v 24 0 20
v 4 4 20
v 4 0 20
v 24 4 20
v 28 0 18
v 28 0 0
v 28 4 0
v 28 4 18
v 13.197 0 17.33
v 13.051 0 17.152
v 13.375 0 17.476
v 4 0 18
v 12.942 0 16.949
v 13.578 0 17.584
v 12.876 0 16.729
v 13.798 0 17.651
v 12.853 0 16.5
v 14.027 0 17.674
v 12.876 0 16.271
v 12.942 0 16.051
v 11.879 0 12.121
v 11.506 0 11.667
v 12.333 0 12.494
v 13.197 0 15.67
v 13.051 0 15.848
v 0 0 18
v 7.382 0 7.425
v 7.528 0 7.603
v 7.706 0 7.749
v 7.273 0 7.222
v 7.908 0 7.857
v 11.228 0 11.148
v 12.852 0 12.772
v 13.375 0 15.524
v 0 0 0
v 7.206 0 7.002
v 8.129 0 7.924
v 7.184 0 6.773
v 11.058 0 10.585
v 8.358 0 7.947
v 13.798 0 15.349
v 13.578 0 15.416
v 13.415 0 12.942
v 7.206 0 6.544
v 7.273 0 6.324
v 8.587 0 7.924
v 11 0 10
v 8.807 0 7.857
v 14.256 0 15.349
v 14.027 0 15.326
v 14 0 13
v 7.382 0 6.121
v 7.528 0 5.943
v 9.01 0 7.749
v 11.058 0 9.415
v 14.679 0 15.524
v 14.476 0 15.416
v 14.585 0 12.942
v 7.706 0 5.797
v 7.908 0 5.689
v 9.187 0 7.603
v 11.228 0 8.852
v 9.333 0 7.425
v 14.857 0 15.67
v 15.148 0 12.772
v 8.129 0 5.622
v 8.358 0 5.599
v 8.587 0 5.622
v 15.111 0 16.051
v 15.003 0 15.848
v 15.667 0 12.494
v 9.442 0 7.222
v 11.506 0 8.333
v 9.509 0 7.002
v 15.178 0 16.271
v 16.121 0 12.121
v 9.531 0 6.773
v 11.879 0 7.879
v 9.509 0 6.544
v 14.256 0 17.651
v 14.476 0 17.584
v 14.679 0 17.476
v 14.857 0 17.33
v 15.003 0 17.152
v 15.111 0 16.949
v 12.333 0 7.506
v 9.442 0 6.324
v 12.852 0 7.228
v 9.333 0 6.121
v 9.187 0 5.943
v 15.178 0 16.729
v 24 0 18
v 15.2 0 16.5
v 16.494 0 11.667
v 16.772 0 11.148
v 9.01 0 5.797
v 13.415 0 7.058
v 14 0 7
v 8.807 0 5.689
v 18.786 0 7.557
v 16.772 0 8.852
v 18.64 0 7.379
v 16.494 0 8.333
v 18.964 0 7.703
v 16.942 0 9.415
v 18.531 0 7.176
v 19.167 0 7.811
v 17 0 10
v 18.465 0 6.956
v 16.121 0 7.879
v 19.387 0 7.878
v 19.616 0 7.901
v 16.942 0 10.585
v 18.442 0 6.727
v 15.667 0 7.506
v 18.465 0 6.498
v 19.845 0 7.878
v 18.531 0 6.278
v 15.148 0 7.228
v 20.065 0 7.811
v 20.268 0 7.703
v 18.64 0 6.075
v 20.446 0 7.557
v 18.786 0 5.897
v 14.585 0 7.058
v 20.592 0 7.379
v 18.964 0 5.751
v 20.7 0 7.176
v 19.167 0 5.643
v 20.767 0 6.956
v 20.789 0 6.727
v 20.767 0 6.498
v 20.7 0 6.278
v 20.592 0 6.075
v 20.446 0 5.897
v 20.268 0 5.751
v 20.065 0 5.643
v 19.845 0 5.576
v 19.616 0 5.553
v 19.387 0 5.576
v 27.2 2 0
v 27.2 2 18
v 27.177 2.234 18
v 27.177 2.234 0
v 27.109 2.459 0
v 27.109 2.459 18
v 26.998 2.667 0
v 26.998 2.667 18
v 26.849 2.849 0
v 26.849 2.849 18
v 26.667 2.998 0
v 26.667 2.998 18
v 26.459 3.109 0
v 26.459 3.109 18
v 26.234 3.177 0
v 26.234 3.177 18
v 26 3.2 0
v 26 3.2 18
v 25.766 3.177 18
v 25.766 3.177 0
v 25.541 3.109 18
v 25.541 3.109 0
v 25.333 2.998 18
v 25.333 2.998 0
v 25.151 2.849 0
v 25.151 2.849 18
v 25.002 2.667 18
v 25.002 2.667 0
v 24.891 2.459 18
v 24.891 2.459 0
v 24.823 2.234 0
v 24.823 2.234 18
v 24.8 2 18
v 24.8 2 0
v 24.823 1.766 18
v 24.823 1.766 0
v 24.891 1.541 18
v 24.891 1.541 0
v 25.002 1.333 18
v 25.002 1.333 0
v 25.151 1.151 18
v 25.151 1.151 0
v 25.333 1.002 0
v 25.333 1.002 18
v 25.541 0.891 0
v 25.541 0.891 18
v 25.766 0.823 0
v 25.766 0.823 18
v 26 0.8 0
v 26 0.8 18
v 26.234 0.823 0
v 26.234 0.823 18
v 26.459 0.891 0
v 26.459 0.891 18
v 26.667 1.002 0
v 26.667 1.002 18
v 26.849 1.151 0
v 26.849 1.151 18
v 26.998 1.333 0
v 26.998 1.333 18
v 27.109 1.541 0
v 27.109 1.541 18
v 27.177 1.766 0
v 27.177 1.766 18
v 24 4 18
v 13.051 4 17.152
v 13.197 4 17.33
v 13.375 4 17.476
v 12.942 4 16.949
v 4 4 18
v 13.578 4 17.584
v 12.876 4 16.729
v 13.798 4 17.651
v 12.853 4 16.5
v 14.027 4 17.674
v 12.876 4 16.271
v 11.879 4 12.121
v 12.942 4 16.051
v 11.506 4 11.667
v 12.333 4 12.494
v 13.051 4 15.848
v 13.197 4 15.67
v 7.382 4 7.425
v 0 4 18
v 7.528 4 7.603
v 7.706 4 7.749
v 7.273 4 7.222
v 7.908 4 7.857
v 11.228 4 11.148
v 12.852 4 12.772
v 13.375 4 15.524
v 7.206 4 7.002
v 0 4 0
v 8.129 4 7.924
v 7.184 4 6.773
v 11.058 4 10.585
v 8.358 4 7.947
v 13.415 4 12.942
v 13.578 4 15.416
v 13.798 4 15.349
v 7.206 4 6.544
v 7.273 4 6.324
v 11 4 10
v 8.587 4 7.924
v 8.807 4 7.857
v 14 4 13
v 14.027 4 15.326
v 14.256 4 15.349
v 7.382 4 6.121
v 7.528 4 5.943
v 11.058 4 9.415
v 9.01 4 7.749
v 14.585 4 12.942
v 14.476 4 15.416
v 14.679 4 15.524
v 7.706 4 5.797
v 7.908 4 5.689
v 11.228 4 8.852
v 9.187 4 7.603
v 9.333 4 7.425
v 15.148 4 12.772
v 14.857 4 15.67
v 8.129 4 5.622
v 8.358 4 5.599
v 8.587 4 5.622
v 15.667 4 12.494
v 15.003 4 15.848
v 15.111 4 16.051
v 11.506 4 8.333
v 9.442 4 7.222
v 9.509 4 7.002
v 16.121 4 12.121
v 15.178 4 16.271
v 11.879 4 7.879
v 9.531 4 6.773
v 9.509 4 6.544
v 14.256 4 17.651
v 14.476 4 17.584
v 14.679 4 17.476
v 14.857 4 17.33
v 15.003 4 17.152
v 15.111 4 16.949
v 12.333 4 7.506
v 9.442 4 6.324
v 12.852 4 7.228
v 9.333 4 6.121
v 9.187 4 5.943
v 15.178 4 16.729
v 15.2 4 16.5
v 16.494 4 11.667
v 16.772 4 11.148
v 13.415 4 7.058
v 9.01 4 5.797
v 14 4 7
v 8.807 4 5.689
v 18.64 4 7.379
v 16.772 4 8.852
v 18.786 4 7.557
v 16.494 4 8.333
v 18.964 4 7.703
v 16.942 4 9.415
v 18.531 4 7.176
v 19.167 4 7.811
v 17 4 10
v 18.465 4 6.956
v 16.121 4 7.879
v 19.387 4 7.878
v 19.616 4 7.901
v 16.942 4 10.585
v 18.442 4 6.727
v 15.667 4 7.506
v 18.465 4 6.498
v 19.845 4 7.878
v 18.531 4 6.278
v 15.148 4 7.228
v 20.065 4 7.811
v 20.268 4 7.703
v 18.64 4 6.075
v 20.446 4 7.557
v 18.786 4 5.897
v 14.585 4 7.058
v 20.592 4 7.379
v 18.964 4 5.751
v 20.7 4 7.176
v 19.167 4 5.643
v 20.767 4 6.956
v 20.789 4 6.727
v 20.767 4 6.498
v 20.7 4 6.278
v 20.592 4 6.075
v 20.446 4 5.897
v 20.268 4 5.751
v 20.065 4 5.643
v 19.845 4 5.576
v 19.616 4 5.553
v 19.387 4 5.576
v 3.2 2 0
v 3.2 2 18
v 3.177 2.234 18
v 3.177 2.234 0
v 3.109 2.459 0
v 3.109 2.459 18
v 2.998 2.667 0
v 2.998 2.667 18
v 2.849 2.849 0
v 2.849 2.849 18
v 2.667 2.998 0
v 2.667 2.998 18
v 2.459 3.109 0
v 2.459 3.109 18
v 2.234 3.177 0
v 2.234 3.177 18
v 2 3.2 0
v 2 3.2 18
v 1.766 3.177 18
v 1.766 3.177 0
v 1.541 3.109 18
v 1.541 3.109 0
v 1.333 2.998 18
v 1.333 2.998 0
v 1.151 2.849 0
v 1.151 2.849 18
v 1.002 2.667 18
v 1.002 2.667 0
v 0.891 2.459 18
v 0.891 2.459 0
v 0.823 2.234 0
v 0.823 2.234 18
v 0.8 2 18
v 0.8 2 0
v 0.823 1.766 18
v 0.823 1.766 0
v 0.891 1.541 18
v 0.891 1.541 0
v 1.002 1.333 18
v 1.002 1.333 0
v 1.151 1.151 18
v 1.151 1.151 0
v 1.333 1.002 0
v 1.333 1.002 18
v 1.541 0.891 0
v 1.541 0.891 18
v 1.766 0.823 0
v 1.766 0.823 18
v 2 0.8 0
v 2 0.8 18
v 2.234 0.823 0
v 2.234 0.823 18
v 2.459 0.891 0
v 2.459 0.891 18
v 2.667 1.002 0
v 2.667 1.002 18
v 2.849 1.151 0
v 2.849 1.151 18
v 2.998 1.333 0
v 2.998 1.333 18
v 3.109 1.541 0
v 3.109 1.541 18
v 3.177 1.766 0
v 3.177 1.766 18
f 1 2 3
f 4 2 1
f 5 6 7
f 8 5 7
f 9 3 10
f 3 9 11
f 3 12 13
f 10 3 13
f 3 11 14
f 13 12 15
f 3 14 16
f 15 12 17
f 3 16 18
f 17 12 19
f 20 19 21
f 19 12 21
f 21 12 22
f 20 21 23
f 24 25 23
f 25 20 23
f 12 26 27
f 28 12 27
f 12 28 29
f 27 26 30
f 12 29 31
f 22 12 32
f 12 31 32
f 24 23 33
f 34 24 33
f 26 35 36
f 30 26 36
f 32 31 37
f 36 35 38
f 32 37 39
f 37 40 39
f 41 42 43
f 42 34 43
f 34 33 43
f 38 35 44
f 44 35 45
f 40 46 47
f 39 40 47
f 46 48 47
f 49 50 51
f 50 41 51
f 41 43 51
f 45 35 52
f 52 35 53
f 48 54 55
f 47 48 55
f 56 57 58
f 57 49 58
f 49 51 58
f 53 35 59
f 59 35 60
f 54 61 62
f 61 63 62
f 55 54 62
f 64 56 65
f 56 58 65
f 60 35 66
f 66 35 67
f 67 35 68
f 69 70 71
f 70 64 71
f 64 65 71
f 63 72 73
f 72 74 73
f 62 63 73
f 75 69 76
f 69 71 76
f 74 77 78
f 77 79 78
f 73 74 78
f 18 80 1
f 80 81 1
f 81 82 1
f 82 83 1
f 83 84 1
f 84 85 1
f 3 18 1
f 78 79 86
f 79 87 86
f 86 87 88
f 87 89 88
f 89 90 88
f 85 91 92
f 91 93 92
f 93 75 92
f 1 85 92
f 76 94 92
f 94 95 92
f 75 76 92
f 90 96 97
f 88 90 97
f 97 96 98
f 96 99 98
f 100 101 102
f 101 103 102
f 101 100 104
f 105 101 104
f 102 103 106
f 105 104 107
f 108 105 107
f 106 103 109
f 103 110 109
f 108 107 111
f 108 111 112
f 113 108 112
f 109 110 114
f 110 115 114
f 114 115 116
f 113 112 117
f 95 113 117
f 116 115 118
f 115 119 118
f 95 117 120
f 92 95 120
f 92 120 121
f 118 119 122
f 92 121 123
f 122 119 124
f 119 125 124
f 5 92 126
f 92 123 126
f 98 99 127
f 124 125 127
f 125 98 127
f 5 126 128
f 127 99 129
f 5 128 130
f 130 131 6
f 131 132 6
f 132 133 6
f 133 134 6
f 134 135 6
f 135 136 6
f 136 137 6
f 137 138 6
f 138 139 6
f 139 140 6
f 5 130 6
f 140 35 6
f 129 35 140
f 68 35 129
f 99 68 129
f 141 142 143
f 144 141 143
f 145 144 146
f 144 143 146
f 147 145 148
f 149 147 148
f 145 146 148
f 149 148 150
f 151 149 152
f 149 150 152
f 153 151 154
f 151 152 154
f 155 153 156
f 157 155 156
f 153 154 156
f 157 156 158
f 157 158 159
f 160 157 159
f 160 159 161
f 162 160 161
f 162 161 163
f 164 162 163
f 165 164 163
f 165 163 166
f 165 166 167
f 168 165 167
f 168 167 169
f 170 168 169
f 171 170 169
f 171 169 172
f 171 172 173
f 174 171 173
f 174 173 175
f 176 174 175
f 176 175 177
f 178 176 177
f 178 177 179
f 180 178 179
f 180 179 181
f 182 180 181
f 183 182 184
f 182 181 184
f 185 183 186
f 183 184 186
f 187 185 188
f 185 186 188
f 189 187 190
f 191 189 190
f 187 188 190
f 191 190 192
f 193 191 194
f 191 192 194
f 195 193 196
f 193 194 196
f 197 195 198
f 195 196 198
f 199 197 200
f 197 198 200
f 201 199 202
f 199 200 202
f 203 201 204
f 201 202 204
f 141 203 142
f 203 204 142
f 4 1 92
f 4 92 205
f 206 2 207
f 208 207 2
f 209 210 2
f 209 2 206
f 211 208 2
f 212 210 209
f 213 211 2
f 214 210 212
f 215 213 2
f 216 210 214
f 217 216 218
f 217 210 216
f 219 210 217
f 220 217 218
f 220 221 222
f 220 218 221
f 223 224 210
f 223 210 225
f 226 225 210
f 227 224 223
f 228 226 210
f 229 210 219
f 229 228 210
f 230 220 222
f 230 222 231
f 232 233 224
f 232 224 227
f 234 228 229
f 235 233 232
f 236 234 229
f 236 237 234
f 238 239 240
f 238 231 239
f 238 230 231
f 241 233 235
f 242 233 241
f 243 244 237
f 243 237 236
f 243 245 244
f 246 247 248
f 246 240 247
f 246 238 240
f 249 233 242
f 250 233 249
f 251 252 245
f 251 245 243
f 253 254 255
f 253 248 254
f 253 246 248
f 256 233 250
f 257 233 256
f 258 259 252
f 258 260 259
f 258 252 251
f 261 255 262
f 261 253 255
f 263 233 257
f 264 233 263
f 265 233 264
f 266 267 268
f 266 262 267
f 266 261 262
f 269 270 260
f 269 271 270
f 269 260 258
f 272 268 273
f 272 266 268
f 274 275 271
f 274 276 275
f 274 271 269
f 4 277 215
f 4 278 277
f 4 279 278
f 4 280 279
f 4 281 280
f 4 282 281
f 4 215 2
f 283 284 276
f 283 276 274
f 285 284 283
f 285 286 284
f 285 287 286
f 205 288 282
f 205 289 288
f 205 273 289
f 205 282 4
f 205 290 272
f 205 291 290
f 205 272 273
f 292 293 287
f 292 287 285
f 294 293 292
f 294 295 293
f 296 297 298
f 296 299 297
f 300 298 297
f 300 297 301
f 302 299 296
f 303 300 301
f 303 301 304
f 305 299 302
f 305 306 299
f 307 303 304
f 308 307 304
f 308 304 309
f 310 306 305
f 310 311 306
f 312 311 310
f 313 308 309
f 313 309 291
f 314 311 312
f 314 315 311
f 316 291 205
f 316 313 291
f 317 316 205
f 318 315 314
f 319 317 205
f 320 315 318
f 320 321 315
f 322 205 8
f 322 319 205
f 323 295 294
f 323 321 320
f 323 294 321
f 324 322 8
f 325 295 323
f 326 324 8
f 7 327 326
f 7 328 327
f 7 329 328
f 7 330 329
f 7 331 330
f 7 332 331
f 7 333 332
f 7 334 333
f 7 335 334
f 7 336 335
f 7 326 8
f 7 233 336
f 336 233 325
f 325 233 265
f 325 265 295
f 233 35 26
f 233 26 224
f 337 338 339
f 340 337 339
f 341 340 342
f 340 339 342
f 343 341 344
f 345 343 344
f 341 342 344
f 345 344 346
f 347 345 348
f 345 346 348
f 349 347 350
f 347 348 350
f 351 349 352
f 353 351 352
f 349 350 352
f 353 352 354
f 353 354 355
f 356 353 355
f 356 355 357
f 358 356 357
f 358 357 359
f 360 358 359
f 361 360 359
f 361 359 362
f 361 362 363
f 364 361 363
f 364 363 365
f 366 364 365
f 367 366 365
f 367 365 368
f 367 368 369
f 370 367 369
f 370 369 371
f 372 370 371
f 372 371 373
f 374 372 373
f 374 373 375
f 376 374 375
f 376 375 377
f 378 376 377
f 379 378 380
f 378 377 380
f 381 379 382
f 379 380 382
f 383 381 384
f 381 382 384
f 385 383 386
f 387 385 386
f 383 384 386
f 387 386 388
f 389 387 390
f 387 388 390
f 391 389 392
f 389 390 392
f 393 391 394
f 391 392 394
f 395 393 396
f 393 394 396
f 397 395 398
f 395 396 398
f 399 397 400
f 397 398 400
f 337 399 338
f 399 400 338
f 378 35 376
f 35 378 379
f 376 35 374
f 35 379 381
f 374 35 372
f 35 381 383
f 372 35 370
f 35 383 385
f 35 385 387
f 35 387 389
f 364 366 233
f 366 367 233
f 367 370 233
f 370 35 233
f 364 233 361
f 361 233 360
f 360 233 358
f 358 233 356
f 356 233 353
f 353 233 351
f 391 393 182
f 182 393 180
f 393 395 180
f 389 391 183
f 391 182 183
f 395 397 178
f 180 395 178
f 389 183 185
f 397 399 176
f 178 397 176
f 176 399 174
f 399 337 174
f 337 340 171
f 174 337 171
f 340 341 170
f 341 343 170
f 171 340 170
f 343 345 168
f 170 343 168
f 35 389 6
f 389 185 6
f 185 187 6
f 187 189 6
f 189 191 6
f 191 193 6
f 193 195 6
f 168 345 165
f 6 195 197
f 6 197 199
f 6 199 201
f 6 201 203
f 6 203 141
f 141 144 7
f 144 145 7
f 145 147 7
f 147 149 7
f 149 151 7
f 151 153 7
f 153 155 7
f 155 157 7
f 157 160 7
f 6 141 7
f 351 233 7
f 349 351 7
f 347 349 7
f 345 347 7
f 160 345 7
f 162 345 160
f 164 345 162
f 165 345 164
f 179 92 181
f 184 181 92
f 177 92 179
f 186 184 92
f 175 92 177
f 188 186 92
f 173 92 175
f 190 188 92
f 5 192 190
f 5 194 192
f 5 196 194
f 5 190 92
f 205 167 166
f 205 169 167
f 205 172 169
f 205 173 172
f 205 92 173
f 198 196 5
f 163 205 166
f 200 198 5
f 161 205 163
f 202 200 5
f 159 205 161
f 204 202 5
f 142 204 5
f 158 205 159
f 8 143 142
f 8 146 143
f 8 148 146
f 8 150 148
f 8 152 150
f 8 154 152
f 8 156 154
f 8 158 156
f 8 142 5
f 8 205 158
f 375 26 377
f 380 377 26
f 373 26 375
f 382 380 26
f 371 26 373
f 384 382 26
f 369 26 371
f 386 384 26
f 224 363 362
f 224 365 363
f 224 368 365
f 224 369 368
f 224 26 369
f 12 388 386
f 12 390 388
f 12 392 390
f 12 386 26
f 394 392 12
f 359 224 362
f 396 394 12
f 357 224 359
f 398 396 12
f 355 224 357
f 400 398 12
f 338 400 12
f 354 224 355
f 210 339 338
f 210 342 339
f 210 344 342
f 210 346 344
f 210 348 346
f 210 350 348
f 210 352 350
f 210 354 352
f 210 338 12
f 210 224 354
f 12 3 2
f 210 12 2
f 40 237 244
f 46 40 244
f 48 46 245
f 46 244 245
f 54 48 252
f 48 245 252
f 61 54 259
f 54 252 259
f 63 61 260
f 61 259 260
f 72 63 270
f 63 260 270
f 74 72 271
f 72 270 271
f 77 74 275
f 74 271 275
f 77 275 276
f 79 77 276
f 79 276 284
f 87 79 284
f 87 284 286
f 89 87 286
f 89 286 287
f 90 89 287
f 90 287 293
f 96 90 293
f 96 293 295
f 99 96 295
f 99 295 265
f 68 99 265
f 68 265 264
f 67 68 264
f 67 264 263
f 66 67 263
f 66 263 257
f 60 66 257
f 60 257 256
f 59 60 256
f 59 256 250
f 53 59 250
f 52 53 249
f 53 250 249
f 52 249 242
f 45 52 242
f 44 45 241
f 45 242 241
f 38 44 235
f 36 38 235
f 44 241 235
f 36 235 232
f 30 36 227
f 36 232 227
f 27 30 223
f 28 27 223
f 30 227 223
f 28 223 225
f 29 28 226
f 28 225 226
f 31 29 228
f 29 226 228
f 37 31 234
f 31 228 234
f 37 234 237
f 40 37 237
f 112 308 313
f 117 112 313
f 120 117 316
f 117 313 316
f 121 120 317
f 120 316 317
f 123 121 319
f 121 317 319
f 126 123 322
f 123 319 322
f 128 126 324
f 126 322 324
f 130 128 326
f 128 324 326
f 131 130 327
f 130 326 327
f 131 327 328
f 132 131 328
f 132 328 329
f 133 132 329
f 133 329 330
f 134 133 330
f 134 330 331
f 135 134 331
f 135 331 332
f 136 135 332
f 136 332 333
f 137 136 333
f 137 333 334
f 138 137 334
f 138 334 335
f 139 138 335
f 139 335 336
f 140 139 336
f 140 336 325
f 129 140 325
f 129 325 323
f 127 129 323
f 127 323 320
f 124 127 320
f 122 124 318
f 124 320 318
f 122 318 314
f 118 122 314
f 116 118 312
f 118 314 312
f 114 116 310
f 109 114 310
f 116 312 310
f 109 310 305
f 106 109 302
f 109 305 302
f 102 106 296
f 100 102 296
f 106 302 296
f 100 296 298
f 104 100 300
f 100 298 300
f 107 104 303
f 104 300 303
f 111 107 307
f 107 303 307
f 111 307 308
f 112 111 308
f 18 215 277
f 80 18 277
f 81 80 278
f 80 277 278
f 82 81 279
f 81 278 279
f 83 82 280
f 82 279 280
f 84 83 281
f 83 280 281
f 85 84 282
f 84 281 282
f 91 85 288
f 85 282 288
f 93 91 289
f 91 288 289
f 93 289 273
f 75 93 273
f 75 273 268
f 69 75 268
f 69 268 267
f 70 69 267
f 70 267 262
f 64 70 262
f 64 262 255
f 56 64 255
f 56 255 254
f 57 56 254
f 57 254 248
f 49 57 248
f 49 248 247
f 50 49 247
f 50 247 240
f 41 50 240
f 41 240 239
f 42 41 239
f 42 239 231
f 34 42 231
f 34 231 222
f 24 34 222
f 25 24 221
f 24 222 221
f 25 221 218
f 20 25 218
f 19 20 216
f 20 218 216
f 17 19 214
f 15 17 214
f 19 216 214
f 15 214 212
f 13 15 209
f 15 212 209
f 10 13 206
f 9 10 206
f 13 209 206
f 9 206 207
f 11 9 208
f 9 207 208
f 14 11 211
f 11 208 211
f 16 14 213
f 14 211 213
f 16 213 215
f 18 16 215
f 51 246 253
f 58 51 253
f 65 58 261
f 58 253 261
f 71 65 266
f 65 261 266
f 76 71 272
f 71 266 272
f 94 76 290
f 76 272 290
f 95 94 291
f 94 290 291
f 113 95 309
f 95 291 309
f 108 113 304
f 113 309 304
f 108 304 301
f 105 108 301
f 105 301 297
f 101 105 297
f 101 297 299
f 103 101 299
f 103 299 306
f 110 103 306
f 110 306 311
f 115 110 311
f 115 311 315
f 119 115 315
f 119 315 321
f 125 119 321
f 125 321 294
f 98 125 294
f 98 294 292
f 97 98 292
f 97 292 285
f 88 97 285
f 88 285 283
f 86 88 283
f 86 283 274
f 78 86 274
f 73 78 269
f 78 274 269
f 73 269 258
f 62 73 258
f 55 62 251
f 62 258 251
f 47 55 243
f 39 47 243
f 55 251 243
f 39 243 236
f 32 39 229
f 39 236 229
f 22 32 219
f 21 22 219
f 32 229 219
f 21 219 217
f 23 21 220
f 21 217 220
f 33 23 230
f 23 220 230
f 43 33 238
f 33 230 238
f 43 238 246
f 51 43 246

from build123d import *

# Parameters (mm, degrees)
ESQUISSE1_W             = 28
ESQUISSE1_H             = 4
BOSS_EXTRU_1_DEPTH      = 20
ESQUISSE2_R             = 1.2
ENL_V_MAT_EXTRU_1_DEPTH = 35.641016151
ESQUISSE3_R             = 3
ESQUISSE3_R_2           = 1.173644897
ENL_V_MAT_EXTRU_3_DEPTH = 35.641016151
ESQUISSE4_W             = 4
ESQUISSE4_H             = 4
ENL_V_MAT_EXTRU_4_DEPTH = 2


with BuildPart() as part:
    # Esquisse1 → Boss.-Extru.1 (new body)
    with BuildSketch(Plane.XY):
        with Locations((14, 2)):
            Rectangle(ESQUISSE1_W, ESQUISSE1_H)
    extrude(amount=BOSS_EXTRU_1_DEPTH)

    # Esquisse2 → Enlèv. mat.-Extru.1 (cut, through all)
    with BuildSketch(Plane.XY.offset(20)):
        with Locations((2, 2)):
            Circle(ESQUISSE2_R)
        with Locations((26, 2)):
            Circle(ESQUISSE2_R)
    extrude(amount=-ENL_V_MAT_EXTRU_1_DEPTH, mode=Mode.SUBTRACT)

    # Esquisse3 → Enlèv. mat.-Extru.3 (cut, through all)
    with BuildSketch(Plane(origin=(0, 4, 0), x_dir=(1, 0, 0), z_dir=(0, 1, 0))):
        with Locations(Location((14, -10, 0), (0, 0, 270))):
            Circle(ESQUISSE3_R)
        with Locations(Location((8.35754662, -6.773125373, 0), (0, 0, 270))):
            Circle(ESQUISSE3_R_2)
        with Locations(Location((19.615782092, -6.726929347, 0), (0, 0, 270))):
            Circle(ESQUISSE3_R_2)
        with Locations(Location((14.026671288, -16.49994528, 0), (0, 0, 270))):
            Circle(ESQUISSE3_R_2)
    extrude(amount=-ENL_V_MAT_EXTRU_3_DEPTH, mode=Mode.SUBTRACT)

    # Esquisse4 → Enlèv. mat.-Extru.4 (cut)
    with BuildSketch(Plane.XY.offset(20)):
        with Locations((2, 2)):
            Rectangle(ESQUISSE4_W, ESQUISSE4_H)
        with Locations((26, 2)):
            Rectangle(ESQUISSE4_W, ESQUISSE4_H)
    extrude(amount=-ENL_V_MAT_EXTRU_4_DEPTH, mode=Mode.SUBTRACT)


solid = part.part
